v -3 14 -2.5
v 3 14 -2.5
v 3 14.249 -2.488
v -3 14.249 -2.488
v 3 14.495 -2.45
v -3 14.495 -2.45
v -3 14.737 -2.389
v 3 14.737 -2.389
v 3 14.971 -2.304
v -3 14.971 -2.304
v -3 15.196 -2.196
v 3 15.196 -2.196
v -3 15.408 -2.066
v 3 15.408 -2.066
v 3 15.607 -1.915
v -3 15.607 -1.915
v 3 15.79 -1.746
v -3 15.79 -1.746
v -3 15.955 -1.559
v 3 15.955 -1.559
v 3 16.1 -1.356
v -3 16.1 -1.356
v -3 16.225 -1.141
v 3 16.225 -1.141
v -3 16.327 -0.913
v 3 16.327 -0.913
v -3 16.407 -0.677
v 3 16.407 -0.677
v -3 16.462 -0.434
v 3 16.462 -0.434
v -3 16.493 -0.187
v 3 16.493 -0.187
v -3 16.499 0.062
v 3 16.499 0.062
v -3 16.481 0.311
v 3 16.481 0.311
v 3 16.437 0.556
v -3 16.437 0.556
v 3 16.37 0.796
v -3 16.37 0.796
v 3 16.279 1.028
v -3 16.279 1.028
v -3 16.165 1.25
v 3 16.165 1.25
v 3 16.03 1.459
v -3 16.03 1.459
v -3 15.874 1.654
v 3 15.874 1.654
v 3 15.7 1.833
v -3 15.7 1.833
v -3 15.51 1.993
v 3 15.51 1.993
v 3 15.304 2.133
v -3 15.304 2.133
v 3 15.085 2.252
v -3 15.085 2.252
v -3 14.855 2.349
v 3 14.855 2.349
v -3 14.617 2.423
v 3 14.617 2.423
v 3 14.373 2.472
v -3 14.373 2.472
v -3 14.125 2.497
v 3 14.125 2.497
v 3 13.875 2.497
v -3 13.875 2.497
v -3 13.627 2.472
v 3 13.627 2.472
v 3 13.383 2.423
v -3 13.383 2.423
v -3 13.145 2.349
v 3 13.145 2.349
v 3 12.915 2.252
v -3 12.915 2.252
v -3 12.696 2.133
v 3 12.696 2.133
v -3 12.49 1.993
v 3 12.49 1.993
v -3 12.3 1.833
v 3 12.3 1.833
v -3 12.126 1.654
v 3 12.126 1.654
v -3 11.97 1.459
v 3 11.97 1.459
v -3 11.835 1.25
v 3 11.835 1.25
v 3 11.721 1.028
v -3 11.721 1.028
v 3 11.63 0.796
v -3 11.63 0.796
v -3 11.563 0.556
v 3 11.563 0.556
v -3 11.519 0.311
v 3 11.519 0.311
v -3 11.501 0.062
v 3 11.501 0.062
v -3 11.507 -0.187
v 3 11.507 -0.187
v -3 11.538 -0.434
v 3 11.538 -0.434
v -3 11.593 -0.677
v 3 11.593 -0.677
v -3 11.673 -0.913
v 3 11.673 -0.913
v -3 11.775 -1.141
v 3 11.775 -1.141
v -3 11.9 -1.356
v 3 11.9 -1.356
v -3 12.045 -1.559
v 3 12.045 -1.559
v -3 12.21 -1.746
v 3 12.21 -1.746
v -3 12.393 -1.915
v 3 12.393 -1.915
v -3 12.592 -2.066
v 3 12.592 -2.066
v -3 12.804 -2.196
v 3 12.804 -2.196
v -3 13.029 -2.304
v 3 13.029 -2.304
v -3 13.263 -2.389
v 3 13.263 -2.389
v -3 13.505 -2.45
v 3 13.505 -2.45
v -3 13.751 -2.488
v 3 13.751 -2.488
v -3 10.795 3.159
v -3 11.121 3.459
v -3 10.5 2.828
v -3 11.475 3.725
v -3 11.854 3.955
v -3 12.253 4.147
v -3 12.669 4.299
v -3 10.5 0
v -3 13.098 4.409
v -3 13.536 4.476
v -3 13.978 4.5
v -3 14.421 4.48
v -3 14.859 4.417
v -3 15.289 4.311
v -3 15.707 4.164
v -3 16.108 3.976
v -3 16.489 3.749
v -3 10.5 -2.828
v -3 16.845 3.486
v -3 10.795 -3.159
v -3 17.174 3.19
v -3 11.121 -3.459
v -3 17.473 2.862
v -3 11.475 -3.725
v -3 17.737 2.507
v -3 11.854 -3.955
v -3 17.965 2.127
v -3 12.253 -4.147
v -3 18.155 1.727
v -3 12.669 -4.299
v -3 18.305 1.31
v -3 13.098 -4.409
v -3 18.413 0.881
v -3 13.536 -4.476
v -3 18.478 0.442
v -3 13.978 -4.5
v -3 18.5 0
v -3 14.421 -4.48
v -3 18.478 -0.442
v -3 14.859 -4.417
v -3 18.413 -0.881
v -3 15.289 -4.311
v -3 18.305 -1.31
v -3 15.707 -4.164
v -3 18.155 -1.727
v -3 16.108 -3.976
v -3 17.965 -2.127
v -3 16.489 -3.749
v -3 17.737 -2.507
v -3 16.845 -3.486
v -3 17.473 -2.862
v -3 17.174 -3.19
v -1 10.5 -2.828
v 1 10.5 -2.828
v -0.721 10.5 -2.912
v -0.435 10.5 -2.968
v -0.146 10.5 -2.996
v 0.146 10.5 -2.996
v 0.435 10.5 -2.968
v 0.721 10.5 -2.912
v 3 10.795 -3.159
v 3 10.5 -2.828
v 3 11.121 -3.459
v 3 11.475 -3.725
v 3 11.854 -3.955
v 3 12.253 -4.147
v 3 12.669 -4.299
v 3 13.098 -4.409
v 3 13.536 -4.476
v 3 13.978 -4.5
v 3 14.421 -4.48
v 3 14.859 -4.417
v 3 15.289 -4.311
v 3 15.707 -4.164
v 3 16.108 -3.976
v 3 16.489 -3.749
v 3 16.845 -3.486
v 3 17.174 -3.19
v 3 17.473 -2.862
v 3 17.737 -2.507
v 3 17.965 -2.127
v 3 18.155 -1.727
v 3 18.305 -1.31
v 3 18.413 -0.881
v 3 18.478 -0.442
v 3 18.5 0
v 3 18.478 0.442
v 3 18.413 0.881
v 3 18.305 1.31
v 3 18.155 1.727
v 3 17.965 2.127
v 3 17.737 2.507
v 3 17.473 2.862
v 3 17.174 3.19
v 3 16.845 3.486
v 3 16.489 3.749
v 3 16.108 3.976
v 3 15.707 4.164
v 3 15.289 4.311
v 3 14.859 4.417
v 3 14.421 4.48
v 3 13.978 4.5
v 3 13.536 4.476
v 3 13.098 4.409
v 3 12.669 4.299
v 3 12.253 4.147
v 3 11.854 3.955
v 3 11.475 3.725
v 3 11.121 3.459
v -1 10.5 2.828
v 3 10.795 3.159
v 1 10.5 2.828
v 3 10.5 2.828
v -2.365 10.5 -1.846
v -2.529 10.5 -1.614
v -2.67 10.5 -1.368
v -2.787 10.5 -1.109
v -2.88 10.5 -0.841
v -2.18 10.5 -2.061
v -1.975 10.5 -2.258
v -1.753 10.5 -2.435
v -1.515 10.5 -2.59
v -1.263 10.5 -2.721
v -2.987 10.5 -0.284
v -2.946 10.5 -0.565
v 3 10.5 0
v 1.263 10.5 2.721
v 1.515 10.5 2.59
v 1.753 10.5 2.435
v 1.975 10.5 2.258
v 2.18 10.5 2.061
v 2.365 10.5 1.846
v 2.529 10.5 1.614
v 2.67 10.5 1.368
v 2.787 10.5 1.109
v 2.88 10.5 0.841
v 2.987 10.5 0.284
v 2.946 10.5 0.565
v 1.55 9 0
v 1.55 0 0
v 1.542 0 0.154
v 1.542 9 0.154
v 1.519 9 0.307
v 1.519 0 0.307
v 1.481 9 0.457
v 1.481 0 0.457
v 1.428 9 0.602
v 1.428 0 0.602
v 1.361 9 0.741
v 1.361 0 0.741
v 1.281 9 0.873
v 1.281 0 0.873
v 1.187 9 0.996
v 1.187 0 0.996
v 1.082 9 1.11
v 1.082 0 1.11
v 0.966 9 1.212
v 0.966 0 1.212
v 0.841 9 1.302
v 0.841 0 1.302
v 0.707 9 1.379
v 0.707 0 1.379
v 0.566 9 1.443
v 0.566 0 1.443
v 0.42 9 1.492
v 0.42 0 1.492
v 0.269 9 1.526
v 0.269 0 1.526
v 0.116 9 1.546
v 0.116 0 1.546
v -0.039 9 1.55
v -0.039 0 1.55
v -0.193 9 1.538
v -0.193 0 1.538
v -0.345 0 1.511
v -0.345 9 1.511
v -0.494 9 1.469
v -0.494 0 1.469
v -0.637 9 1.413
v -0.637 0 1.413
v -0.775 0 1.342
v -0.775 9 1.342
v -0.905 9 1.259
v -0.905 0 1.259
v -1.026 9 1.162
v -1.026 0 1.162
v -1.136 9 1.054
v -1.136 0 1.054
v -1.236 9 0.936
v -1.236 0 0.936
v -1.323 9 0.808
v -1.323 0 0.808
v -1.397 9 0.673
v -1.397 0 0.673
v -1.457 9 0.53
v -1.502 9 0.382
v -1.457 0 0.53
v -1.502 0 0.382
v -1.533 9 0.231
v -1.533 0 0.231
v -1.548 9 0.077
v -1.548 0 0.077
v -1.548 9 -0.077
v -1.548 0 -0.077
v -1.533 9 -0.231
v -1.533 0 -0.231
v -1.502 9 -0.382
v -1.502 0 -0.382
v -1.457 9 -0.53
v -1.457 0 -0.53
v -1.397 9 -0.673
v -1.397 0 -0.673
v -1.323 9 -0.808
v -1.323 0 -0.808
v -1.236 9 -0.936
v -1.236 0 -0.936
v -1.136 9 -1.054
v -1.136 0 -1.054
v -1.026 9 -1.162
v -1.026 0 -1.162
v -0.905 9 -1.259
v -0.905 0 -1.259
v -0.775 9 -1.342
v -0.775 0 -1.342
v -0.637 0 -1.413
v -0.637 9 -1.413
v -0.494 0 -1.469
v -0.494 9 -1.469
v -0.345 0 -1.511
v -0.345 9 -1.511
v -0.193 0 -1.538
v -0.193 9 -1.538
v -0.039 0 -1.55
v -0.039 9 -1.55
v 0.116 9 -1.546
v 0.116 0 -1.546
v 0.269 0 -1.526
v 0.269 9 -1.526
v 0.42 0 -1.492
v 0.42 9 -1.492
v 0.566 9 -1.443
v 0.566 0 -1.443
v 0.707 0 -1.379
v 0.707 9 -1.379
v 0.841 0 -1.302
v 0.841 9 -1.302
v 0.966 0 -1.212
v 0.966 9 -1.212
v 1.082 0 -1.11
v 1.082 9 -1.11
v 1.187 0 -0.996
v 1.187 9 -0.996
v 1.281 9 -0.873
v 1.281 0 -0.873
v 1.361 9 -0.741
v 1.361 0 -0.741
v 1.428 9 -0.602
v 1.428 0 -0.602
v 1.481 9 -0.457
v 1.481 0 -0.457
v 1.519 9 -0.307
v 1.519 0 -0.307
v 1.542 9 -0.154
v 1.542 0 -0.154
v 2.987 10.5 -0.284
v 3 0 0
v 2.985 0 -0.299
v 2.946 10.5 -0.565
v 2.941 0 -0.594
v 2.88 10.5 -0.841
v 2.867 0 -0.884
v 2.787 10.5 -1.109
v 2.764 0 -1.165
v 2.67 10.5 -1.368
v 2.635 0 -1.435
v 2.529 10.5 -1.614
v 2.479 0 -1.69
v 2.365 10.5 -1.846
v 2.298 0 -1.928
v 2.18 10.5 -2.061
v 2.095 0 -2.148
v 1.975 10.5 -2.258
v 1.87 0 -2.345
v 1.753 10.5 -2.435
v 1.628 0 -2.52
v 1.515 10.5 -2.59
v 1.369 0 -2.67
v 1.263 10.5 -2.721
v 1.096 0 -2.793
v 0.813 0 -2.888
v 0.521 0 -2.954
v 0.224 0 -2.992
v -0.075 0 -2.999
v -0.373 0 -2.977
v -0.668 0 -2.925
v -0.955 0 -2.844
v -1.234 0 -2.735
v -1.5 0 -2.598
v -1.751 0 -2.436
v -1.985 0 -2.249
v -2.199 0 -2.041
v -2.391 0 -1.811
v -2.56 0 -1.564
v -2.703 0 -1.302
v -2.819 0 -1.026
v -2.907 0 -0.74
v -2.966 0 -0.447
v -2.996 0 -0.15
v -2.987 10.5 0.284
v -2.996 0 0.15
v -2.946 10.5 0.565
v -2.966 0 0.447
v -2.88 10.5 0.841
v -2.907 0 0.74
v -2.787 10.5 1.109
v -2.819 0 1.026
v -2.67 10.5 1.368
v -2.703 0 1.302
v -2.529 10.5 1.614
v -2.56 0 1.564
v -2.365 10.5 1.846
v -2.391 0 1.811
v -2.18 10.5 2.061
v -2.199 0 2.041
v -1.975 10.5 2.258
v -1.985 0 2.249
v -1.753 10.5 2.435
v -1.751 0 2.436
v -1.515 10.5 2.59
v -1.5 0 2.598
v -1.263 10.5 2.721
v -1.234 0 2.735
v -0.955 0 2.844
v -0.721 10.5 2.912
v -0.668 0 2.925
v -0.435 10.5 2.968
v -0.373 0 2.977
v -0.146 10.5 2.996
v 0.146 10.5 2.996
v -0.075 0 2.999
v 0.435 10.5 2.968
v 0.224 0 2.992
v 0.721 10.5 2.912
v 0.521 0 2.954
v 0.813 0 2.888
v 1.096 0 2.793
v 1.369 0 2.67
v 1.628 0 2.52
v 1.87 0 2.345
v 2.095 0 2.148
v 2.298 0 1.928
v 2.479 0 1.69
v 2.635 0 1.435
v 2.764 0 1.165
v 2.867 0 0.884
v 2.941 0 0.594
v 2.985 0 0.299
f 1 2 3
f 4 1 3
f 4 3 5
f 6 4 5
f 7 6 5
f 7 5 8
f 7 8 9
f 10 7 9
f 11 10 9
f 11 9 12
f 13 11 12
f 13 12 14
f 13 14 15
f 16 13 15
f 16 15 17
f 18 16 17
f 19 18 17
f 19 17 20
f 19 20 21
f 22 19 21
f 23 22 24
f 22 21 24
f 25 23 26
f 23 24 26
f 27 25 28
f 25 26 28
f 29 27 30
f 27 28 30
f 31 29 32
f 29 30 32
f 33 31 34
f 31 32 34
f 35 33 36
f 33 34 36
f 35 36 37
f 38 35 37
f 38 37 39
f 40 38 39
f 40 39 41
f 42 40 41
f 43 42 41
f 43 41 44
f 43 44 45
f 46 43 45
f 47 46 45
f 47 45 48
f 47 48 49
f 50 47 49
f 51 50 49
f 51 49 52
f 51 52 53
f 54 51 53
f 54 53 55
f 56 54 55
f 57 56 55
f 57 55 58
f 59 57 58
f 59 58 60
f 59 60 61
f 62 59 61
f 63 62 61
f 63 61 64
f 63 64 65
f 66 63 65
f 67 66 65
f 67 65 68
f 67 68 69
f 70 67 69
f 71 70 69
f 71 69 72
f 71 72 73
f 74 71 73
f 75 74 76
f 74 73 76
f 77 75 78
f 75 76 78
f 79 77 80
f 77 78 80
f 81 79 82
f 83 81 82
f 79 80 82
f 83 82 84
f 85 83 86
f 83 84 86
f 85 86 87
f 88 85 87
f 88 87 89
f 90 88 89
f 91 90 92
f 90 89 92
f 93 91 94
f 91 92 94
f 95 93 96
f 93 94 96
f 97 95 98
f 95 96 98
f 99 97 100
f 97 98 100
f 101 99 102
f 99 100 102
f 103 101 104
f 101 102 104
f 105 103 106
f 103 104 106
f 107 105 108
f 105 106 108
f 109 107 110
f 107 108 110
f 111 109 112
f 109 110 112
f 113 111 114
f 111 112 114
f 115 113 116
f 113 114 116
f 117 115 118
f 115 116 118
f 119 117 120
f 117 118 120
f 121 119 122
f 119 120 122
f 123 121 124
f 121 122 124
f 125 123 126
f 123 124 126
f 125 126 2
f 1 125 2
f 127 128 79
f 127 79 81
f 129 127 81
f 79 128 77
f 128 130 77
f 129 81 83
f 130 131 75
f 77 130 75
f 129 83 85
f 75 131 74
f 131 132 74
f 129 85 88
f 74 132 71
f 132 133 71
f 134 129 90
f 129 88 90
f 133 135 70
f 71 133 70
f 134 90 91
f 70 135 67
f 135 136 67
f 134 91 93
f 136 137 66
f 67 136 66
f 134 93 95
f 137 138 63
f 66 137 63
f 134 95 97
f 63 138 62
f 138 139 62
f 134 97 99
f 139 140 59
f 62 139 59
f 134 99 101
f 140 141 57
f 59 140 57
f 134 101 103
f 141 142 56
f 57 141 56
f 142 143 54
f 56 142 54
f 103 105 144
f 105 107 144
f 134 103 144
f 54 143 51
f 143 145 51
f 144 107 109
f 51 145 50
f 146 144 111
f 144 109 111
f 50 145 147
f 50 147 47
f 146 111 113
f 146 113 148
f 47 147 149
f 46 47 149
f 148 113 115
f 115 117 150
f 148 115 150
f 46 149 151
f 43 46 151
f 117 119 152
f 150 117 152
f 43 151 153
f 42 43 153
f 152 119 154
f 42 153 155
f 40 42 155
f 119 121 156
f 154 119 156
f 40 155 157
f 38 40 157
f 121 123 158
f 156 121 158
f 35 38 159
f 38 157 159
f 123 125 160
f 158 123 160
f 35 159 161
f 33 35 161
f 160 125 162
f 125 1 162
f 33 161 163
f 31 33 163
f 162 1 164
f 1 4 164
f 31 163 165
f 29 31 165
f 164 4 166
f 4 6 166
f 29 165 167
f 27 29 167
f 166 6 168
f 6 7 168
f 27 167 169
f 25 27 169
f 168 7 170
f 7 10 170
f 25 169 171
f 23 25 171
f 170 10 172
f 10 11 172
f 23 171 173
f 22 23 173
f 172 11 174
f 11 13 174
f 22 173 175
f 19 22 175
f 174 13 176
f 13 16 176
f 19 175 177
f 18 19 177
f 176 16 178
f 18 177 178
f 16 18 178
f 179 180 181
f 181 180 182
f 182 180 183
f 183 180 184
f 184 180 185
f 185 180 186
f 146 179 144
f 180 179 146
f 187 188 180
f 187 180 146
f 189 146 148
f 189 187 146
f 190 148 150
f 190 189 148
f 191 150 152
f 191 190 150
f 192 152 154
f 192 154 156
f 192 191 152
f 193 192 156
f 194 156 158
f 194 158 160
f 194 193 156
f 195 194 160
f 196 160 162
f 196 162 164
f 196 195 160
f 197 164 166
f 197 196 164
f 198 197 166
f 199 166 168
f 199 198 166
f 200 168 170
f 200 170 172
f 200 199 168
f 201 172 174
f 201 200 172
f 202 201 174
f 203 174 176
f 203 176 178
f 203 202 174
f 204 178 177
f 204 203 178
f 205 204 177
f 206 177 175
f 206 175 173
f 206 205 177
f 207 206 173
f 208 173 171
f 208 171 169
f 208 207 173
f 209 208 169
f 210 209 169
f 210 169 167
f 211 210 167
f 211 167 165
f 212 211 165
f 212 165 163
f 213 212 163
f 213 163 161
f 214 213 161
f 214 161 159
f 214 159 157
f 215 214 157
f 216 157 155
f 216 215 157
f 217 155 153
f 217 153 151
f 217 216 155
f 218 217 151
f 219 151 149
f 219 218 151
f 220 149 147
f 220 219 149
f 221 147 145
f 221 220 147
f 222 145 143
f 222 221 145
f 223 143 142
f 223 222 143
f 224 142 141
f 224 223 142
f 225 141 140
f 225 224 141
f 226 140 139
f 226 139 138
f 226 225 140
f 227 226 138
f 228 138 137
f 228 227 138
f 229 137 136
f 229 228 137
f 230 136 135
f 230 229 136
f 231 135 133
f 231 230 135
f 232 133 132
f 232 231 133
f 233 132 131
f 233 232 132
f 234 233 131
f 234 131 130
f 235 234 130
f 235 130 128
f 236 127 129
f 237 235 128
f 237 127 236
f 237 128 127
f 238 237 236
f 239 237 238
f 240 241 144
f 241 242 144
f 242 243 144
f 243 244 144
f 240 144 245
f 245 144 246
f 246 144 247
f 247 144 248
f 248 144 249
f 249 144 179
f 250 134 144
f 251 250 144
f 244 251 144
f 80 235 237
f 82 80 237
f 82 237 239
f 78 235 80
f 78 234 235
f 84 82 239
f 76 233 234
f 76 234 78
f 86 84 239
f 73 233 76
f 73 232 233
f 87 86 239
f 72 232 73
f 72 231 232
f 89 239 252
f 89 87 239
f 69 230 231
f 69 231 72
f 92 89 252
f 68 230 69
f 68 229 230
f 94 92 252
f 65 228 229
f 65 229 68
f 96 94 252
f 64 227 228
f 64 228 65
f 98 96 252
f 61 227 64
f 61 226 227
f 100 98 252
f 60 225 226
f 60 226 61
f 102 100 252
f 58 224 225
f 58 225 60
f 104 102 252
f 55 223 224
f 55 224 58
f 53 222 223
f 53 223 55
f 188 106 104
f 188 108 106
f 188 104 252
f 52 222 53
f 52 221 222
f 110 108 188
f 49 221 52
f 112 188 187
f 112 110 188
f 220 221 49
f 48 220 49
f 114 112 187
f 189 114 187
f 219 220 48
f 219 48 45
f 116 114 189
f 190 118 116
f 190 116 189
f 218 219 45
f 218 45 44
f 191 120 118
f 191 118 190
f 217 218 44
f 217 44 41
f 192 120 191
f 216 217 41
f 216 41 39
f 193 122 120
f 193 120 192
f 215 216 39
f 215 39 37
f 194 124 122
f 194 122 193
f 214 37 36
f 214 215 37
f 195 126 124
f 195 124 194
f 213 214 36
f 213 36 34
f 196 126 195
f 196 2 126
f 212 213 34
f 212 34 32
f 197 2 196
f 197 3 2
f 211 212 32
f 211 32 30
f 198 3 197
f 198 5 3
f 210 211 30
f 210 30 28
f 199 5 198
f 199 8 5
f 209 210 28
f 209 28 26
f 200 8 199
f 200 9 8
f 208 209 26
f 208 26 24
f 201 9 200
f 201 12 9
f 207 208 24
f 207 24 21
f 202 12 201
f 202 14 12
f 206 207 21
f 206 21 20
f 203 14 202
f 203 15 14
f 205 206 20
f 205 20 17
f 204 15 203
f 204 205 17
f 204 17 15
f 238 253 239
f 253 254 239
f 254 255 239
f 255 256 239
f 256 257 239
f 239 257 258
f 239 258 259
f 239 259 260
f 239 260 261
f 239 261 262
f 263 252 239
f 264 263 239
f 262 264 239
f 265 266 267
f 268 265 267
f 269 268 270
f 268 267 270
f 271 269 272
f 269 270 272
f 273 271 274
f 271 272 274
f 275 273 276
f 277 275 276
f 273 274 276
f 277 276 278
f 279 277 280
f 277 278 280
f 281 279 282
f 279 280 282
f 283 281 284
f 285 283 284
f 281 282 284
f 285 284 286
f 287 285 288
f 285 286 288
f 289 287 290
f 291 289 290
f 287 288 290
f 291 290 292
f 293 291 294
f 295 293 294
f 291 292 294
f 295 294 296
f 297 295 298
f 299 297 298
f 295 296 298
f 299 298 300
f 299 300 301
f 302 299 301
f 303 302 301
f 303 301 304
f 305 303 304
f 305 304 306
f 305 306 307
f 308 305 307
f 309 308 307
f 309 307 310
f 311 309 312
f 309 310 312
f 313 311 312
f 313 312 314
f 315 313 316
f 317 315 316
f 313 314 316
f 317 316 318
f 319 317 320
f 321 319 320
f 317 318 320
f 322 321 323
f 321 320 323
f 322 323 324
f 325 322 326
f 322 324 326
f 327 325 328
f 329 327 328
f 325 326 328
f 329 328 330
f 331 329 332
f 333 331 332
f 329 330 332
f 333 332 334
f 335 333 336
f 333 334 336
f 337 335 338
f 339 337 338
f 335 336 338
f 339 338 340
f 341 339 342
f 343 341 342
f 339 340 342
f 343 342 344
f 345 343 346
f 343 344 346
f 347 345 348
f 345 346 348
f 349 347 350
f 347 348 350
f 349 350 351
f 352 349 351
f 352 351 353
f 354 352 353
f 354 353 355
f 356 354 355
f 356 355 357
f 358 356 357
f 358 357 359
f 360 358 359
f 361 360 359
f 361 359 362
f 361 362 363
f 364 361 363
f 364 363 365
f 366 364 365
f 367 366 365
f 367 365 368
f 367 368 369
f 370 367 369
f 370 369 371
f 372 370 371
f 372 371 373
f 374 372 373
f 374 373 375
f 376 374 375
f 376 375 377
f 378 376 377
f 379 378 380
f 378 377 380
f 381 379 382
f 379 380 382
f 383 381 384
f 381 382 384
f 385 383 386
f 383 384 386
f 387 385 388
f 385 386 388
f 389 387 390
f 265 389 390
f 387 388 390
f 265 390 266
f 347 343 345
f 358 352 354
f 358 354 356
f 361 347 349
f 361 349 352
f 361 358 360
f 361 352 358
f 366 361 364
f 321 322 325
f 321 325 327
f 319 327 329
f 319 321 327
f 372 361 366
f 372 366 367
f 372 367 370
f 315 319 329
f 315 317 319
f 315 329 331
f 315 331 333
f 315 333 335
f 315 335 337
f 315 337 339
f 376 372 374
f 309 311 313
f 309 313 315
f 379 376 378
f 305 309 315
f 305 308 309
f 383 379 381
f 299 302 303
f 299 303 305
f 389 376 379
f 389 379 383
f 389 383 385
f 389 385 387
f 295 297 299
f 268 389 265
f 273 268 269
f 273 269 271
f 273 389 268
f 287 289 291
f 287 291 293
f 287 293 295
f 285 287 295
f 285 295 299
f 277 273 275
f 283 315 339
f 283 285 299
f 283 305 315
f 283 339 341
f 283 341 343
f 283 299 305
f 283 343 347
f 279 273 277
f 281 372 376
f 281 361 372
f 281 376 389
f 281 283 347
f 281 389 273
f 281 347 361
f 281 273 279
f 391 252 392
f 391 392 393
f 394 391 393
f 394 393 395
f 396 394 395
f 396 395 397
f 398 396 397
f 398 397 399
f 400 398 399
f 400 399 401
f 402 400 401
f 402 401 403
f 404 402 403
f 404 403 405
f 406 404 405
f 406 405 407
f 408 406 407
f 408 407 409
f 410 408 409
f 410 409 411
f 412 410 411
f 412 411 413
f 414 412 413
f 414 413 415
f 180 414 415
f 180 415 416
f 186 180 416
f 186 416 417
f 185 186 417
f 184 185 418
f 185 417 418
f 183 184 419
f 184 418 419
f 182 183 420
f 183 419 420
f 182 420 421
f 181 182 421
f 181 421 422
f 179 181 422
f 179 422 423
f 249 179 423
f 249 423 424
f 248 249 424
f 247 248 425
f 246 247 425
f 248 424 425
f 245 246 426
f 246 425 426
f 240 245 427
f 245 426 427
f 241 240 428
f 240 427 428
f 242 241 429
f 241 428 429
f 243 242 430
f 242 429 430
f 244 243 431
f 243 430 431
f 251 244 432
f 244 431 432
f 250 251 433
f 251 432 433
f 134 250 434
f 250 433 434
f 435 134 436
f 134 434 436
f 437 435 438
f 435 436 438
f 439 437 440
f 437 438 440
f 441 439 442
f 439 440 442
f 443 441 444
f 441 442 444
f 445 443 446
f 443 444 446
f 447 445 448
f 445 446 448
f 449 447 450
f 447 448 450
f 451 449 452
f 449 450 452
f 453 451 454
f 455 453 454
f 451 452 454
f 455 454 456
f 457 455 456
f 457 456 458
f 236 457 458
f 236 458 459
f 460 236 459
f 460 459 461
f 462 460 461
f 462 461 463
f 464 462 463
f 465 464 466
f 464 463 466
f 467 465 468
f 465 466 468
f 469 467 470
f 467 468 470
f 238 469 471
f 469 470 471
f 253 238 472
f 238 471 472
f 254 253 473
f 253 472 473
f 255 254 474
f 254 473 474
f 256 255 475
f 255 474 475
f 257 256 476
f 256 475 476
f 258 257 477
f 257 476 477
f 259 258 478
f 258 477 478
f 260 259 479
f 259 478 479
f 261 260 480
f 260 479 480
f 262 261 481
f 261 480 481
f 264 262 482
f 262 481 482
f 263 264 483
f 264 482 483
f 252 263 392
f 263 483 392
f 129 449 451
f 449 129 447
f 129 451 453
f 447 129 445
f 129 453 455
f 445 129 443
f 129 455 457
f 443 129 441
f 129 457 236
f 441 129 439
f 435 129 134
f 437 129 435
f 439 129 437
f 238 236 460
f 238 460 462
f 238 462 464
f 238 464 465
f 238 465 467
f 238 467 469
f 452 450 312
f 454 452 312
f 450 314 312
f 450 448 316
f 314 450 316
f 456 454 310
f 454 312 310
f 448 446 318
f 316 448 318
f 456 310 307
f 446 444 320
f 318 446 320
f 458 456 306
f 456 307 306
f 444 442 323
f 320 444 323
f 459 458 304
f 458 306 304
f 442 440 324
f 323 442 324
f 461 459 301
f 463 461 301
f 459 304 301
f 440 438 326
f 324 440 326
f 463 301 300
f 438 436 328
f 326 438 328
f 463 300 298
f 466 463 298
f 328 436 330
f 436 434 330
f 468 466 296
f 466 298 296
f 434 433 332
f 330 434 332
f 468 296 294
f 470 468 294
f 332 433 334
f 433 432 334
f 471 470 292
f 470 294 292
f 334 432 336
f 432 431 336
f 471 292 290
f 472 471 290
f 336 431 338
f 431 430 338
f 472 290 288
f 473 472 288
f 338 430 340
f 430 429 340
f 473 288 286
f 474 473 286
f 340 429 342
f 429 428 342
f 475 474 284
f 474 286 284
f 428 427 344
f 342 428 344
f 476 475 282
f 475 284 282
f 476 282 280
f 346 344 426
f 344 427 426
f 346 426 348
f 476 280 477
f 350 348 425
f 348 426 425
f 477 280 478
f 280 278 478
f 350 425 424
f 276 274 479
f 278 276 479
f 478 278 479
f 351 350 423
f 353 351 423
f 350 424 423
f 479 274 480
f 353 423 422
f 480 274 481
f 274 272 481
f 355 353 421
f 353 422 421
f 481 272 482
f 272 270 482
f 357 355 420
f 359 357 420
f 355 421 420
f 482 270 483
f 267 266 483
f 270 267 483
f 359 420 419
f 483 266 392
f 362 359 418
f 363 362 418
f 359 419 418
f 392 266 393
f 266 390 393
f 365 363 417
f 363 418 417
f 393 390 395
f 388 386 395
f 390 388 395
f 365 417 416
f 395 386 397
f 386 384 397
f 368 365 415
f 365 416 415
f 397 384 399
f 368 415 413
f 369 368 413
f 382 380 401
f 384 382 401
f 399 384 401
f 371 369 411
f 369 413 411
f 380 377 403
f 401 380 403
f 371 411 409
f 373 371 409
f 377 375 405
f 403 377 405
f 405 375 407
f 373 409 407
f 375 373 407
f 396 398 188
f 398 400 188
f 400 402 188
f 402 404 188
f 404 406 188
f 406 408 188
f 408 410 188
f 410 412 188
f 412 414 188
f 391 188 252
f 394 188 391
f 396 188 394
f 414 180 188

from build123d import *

# Parameters (mm, degrees)
SKETCH1_R                 = 3
CRANK_BODY_DEPTH          = 10
SKETCH2_R                 = 1.55
DOWEL_SHAFT_DEPTH         = 9
PIN_SHAFT_BODY_DEPTH      = 3
PIN_SHAFT_BODY_DEPTH_BACK = 3
SKETCH4_R                 = 2.5
PIN_SHAFT_DEPTH           = 20.962464778
SKETCH1_2_OUTSIDE_W       = 12.286
SKETCH1_2_OUTSIDE_H       = 15.286
SKETCH1_2_OUTSIDE_R       = 3
SMOOTHING_CUTS_DEPTH      = 10.5


with BuildPart() as part:
    # Sketch1 → crank_body (new body)
    with BuildSketch(Plane(origin=(0, 0, 0), x_dir=(1, 0, 0), z_dir=(0, 1, 0))):
        Circle(SKETCH1_R)
    extrude(amount=CRANK_BODY_DEPTH)

    # Sketch2 → dowel_shaft (cut)
    with BuildSketch(Plane.XZ):
        Circle(SKETCH2_R)
    extrude(amount=-DOWEL_SHAFT_DEPTH, mode=Mode.SUBTRACT)

    # Sketch3 → pin_shaft_body (add, two sides: drawn at the far end of the back side and taken through both)
    with BuildSketch(Plane(origin=(0, 0, 0), x_dir=(0, 0, -1), z_dir=(1, 0, 0)).offset(-PIN_SHAFT_BODY_DEPTH_BACK)):
        with BuildLine():
            Line((-3, 10.5), (-3, 10))
            Line((-3, 10), (3, 10))
            Line((3, 10), (3, 10.5))
            Line((3, 10.5), (2.828427125, 10.5))
            ThreePointArc((2.828427125, 10.5), (0, 18.5), (-2.828427125, 10.5))
            Line((-2.828427125, 10.5), (-3, 10.5))
        make_face()
    extrude(amount=PIN_SHAFT_BODY_DEPTH + PIN_SHAFT_BODY_DEPTH_BACK)

    # Sketch4 → pin_shaft (cut, through all)
    with BuildSketch(Plane(origin=(3, 0, 0), x_dir=(0, 0, -1), z_dir=(1, 0, 0))):
        with Locations((0, 14)):
            Circle(SKETCH4_R)
    extrude(amount=-PIN_SHAFT_DEPTH, mode=Mode.SUBTRACT)

    # Sketch1<2> outside → smoothing_cuts (cut)
    with BuildSketch(Plane(origin=(0, 0, 0), x_dir=(1, 0, 0), z_dir=(0, 1, 0))):
        Rectangle(SKETCH1_2_OUTSIDE_W, SKETCH1_2_OUTSIDE_H)
        Circle(SKETCH1_2_OUTSIDE_R, mode=Mode.SUBTRACT)
    extrude(amount=SMOOTHING_CUTS_DEPTH, mode=Mode.SUBTRACT)


solid = part.part
